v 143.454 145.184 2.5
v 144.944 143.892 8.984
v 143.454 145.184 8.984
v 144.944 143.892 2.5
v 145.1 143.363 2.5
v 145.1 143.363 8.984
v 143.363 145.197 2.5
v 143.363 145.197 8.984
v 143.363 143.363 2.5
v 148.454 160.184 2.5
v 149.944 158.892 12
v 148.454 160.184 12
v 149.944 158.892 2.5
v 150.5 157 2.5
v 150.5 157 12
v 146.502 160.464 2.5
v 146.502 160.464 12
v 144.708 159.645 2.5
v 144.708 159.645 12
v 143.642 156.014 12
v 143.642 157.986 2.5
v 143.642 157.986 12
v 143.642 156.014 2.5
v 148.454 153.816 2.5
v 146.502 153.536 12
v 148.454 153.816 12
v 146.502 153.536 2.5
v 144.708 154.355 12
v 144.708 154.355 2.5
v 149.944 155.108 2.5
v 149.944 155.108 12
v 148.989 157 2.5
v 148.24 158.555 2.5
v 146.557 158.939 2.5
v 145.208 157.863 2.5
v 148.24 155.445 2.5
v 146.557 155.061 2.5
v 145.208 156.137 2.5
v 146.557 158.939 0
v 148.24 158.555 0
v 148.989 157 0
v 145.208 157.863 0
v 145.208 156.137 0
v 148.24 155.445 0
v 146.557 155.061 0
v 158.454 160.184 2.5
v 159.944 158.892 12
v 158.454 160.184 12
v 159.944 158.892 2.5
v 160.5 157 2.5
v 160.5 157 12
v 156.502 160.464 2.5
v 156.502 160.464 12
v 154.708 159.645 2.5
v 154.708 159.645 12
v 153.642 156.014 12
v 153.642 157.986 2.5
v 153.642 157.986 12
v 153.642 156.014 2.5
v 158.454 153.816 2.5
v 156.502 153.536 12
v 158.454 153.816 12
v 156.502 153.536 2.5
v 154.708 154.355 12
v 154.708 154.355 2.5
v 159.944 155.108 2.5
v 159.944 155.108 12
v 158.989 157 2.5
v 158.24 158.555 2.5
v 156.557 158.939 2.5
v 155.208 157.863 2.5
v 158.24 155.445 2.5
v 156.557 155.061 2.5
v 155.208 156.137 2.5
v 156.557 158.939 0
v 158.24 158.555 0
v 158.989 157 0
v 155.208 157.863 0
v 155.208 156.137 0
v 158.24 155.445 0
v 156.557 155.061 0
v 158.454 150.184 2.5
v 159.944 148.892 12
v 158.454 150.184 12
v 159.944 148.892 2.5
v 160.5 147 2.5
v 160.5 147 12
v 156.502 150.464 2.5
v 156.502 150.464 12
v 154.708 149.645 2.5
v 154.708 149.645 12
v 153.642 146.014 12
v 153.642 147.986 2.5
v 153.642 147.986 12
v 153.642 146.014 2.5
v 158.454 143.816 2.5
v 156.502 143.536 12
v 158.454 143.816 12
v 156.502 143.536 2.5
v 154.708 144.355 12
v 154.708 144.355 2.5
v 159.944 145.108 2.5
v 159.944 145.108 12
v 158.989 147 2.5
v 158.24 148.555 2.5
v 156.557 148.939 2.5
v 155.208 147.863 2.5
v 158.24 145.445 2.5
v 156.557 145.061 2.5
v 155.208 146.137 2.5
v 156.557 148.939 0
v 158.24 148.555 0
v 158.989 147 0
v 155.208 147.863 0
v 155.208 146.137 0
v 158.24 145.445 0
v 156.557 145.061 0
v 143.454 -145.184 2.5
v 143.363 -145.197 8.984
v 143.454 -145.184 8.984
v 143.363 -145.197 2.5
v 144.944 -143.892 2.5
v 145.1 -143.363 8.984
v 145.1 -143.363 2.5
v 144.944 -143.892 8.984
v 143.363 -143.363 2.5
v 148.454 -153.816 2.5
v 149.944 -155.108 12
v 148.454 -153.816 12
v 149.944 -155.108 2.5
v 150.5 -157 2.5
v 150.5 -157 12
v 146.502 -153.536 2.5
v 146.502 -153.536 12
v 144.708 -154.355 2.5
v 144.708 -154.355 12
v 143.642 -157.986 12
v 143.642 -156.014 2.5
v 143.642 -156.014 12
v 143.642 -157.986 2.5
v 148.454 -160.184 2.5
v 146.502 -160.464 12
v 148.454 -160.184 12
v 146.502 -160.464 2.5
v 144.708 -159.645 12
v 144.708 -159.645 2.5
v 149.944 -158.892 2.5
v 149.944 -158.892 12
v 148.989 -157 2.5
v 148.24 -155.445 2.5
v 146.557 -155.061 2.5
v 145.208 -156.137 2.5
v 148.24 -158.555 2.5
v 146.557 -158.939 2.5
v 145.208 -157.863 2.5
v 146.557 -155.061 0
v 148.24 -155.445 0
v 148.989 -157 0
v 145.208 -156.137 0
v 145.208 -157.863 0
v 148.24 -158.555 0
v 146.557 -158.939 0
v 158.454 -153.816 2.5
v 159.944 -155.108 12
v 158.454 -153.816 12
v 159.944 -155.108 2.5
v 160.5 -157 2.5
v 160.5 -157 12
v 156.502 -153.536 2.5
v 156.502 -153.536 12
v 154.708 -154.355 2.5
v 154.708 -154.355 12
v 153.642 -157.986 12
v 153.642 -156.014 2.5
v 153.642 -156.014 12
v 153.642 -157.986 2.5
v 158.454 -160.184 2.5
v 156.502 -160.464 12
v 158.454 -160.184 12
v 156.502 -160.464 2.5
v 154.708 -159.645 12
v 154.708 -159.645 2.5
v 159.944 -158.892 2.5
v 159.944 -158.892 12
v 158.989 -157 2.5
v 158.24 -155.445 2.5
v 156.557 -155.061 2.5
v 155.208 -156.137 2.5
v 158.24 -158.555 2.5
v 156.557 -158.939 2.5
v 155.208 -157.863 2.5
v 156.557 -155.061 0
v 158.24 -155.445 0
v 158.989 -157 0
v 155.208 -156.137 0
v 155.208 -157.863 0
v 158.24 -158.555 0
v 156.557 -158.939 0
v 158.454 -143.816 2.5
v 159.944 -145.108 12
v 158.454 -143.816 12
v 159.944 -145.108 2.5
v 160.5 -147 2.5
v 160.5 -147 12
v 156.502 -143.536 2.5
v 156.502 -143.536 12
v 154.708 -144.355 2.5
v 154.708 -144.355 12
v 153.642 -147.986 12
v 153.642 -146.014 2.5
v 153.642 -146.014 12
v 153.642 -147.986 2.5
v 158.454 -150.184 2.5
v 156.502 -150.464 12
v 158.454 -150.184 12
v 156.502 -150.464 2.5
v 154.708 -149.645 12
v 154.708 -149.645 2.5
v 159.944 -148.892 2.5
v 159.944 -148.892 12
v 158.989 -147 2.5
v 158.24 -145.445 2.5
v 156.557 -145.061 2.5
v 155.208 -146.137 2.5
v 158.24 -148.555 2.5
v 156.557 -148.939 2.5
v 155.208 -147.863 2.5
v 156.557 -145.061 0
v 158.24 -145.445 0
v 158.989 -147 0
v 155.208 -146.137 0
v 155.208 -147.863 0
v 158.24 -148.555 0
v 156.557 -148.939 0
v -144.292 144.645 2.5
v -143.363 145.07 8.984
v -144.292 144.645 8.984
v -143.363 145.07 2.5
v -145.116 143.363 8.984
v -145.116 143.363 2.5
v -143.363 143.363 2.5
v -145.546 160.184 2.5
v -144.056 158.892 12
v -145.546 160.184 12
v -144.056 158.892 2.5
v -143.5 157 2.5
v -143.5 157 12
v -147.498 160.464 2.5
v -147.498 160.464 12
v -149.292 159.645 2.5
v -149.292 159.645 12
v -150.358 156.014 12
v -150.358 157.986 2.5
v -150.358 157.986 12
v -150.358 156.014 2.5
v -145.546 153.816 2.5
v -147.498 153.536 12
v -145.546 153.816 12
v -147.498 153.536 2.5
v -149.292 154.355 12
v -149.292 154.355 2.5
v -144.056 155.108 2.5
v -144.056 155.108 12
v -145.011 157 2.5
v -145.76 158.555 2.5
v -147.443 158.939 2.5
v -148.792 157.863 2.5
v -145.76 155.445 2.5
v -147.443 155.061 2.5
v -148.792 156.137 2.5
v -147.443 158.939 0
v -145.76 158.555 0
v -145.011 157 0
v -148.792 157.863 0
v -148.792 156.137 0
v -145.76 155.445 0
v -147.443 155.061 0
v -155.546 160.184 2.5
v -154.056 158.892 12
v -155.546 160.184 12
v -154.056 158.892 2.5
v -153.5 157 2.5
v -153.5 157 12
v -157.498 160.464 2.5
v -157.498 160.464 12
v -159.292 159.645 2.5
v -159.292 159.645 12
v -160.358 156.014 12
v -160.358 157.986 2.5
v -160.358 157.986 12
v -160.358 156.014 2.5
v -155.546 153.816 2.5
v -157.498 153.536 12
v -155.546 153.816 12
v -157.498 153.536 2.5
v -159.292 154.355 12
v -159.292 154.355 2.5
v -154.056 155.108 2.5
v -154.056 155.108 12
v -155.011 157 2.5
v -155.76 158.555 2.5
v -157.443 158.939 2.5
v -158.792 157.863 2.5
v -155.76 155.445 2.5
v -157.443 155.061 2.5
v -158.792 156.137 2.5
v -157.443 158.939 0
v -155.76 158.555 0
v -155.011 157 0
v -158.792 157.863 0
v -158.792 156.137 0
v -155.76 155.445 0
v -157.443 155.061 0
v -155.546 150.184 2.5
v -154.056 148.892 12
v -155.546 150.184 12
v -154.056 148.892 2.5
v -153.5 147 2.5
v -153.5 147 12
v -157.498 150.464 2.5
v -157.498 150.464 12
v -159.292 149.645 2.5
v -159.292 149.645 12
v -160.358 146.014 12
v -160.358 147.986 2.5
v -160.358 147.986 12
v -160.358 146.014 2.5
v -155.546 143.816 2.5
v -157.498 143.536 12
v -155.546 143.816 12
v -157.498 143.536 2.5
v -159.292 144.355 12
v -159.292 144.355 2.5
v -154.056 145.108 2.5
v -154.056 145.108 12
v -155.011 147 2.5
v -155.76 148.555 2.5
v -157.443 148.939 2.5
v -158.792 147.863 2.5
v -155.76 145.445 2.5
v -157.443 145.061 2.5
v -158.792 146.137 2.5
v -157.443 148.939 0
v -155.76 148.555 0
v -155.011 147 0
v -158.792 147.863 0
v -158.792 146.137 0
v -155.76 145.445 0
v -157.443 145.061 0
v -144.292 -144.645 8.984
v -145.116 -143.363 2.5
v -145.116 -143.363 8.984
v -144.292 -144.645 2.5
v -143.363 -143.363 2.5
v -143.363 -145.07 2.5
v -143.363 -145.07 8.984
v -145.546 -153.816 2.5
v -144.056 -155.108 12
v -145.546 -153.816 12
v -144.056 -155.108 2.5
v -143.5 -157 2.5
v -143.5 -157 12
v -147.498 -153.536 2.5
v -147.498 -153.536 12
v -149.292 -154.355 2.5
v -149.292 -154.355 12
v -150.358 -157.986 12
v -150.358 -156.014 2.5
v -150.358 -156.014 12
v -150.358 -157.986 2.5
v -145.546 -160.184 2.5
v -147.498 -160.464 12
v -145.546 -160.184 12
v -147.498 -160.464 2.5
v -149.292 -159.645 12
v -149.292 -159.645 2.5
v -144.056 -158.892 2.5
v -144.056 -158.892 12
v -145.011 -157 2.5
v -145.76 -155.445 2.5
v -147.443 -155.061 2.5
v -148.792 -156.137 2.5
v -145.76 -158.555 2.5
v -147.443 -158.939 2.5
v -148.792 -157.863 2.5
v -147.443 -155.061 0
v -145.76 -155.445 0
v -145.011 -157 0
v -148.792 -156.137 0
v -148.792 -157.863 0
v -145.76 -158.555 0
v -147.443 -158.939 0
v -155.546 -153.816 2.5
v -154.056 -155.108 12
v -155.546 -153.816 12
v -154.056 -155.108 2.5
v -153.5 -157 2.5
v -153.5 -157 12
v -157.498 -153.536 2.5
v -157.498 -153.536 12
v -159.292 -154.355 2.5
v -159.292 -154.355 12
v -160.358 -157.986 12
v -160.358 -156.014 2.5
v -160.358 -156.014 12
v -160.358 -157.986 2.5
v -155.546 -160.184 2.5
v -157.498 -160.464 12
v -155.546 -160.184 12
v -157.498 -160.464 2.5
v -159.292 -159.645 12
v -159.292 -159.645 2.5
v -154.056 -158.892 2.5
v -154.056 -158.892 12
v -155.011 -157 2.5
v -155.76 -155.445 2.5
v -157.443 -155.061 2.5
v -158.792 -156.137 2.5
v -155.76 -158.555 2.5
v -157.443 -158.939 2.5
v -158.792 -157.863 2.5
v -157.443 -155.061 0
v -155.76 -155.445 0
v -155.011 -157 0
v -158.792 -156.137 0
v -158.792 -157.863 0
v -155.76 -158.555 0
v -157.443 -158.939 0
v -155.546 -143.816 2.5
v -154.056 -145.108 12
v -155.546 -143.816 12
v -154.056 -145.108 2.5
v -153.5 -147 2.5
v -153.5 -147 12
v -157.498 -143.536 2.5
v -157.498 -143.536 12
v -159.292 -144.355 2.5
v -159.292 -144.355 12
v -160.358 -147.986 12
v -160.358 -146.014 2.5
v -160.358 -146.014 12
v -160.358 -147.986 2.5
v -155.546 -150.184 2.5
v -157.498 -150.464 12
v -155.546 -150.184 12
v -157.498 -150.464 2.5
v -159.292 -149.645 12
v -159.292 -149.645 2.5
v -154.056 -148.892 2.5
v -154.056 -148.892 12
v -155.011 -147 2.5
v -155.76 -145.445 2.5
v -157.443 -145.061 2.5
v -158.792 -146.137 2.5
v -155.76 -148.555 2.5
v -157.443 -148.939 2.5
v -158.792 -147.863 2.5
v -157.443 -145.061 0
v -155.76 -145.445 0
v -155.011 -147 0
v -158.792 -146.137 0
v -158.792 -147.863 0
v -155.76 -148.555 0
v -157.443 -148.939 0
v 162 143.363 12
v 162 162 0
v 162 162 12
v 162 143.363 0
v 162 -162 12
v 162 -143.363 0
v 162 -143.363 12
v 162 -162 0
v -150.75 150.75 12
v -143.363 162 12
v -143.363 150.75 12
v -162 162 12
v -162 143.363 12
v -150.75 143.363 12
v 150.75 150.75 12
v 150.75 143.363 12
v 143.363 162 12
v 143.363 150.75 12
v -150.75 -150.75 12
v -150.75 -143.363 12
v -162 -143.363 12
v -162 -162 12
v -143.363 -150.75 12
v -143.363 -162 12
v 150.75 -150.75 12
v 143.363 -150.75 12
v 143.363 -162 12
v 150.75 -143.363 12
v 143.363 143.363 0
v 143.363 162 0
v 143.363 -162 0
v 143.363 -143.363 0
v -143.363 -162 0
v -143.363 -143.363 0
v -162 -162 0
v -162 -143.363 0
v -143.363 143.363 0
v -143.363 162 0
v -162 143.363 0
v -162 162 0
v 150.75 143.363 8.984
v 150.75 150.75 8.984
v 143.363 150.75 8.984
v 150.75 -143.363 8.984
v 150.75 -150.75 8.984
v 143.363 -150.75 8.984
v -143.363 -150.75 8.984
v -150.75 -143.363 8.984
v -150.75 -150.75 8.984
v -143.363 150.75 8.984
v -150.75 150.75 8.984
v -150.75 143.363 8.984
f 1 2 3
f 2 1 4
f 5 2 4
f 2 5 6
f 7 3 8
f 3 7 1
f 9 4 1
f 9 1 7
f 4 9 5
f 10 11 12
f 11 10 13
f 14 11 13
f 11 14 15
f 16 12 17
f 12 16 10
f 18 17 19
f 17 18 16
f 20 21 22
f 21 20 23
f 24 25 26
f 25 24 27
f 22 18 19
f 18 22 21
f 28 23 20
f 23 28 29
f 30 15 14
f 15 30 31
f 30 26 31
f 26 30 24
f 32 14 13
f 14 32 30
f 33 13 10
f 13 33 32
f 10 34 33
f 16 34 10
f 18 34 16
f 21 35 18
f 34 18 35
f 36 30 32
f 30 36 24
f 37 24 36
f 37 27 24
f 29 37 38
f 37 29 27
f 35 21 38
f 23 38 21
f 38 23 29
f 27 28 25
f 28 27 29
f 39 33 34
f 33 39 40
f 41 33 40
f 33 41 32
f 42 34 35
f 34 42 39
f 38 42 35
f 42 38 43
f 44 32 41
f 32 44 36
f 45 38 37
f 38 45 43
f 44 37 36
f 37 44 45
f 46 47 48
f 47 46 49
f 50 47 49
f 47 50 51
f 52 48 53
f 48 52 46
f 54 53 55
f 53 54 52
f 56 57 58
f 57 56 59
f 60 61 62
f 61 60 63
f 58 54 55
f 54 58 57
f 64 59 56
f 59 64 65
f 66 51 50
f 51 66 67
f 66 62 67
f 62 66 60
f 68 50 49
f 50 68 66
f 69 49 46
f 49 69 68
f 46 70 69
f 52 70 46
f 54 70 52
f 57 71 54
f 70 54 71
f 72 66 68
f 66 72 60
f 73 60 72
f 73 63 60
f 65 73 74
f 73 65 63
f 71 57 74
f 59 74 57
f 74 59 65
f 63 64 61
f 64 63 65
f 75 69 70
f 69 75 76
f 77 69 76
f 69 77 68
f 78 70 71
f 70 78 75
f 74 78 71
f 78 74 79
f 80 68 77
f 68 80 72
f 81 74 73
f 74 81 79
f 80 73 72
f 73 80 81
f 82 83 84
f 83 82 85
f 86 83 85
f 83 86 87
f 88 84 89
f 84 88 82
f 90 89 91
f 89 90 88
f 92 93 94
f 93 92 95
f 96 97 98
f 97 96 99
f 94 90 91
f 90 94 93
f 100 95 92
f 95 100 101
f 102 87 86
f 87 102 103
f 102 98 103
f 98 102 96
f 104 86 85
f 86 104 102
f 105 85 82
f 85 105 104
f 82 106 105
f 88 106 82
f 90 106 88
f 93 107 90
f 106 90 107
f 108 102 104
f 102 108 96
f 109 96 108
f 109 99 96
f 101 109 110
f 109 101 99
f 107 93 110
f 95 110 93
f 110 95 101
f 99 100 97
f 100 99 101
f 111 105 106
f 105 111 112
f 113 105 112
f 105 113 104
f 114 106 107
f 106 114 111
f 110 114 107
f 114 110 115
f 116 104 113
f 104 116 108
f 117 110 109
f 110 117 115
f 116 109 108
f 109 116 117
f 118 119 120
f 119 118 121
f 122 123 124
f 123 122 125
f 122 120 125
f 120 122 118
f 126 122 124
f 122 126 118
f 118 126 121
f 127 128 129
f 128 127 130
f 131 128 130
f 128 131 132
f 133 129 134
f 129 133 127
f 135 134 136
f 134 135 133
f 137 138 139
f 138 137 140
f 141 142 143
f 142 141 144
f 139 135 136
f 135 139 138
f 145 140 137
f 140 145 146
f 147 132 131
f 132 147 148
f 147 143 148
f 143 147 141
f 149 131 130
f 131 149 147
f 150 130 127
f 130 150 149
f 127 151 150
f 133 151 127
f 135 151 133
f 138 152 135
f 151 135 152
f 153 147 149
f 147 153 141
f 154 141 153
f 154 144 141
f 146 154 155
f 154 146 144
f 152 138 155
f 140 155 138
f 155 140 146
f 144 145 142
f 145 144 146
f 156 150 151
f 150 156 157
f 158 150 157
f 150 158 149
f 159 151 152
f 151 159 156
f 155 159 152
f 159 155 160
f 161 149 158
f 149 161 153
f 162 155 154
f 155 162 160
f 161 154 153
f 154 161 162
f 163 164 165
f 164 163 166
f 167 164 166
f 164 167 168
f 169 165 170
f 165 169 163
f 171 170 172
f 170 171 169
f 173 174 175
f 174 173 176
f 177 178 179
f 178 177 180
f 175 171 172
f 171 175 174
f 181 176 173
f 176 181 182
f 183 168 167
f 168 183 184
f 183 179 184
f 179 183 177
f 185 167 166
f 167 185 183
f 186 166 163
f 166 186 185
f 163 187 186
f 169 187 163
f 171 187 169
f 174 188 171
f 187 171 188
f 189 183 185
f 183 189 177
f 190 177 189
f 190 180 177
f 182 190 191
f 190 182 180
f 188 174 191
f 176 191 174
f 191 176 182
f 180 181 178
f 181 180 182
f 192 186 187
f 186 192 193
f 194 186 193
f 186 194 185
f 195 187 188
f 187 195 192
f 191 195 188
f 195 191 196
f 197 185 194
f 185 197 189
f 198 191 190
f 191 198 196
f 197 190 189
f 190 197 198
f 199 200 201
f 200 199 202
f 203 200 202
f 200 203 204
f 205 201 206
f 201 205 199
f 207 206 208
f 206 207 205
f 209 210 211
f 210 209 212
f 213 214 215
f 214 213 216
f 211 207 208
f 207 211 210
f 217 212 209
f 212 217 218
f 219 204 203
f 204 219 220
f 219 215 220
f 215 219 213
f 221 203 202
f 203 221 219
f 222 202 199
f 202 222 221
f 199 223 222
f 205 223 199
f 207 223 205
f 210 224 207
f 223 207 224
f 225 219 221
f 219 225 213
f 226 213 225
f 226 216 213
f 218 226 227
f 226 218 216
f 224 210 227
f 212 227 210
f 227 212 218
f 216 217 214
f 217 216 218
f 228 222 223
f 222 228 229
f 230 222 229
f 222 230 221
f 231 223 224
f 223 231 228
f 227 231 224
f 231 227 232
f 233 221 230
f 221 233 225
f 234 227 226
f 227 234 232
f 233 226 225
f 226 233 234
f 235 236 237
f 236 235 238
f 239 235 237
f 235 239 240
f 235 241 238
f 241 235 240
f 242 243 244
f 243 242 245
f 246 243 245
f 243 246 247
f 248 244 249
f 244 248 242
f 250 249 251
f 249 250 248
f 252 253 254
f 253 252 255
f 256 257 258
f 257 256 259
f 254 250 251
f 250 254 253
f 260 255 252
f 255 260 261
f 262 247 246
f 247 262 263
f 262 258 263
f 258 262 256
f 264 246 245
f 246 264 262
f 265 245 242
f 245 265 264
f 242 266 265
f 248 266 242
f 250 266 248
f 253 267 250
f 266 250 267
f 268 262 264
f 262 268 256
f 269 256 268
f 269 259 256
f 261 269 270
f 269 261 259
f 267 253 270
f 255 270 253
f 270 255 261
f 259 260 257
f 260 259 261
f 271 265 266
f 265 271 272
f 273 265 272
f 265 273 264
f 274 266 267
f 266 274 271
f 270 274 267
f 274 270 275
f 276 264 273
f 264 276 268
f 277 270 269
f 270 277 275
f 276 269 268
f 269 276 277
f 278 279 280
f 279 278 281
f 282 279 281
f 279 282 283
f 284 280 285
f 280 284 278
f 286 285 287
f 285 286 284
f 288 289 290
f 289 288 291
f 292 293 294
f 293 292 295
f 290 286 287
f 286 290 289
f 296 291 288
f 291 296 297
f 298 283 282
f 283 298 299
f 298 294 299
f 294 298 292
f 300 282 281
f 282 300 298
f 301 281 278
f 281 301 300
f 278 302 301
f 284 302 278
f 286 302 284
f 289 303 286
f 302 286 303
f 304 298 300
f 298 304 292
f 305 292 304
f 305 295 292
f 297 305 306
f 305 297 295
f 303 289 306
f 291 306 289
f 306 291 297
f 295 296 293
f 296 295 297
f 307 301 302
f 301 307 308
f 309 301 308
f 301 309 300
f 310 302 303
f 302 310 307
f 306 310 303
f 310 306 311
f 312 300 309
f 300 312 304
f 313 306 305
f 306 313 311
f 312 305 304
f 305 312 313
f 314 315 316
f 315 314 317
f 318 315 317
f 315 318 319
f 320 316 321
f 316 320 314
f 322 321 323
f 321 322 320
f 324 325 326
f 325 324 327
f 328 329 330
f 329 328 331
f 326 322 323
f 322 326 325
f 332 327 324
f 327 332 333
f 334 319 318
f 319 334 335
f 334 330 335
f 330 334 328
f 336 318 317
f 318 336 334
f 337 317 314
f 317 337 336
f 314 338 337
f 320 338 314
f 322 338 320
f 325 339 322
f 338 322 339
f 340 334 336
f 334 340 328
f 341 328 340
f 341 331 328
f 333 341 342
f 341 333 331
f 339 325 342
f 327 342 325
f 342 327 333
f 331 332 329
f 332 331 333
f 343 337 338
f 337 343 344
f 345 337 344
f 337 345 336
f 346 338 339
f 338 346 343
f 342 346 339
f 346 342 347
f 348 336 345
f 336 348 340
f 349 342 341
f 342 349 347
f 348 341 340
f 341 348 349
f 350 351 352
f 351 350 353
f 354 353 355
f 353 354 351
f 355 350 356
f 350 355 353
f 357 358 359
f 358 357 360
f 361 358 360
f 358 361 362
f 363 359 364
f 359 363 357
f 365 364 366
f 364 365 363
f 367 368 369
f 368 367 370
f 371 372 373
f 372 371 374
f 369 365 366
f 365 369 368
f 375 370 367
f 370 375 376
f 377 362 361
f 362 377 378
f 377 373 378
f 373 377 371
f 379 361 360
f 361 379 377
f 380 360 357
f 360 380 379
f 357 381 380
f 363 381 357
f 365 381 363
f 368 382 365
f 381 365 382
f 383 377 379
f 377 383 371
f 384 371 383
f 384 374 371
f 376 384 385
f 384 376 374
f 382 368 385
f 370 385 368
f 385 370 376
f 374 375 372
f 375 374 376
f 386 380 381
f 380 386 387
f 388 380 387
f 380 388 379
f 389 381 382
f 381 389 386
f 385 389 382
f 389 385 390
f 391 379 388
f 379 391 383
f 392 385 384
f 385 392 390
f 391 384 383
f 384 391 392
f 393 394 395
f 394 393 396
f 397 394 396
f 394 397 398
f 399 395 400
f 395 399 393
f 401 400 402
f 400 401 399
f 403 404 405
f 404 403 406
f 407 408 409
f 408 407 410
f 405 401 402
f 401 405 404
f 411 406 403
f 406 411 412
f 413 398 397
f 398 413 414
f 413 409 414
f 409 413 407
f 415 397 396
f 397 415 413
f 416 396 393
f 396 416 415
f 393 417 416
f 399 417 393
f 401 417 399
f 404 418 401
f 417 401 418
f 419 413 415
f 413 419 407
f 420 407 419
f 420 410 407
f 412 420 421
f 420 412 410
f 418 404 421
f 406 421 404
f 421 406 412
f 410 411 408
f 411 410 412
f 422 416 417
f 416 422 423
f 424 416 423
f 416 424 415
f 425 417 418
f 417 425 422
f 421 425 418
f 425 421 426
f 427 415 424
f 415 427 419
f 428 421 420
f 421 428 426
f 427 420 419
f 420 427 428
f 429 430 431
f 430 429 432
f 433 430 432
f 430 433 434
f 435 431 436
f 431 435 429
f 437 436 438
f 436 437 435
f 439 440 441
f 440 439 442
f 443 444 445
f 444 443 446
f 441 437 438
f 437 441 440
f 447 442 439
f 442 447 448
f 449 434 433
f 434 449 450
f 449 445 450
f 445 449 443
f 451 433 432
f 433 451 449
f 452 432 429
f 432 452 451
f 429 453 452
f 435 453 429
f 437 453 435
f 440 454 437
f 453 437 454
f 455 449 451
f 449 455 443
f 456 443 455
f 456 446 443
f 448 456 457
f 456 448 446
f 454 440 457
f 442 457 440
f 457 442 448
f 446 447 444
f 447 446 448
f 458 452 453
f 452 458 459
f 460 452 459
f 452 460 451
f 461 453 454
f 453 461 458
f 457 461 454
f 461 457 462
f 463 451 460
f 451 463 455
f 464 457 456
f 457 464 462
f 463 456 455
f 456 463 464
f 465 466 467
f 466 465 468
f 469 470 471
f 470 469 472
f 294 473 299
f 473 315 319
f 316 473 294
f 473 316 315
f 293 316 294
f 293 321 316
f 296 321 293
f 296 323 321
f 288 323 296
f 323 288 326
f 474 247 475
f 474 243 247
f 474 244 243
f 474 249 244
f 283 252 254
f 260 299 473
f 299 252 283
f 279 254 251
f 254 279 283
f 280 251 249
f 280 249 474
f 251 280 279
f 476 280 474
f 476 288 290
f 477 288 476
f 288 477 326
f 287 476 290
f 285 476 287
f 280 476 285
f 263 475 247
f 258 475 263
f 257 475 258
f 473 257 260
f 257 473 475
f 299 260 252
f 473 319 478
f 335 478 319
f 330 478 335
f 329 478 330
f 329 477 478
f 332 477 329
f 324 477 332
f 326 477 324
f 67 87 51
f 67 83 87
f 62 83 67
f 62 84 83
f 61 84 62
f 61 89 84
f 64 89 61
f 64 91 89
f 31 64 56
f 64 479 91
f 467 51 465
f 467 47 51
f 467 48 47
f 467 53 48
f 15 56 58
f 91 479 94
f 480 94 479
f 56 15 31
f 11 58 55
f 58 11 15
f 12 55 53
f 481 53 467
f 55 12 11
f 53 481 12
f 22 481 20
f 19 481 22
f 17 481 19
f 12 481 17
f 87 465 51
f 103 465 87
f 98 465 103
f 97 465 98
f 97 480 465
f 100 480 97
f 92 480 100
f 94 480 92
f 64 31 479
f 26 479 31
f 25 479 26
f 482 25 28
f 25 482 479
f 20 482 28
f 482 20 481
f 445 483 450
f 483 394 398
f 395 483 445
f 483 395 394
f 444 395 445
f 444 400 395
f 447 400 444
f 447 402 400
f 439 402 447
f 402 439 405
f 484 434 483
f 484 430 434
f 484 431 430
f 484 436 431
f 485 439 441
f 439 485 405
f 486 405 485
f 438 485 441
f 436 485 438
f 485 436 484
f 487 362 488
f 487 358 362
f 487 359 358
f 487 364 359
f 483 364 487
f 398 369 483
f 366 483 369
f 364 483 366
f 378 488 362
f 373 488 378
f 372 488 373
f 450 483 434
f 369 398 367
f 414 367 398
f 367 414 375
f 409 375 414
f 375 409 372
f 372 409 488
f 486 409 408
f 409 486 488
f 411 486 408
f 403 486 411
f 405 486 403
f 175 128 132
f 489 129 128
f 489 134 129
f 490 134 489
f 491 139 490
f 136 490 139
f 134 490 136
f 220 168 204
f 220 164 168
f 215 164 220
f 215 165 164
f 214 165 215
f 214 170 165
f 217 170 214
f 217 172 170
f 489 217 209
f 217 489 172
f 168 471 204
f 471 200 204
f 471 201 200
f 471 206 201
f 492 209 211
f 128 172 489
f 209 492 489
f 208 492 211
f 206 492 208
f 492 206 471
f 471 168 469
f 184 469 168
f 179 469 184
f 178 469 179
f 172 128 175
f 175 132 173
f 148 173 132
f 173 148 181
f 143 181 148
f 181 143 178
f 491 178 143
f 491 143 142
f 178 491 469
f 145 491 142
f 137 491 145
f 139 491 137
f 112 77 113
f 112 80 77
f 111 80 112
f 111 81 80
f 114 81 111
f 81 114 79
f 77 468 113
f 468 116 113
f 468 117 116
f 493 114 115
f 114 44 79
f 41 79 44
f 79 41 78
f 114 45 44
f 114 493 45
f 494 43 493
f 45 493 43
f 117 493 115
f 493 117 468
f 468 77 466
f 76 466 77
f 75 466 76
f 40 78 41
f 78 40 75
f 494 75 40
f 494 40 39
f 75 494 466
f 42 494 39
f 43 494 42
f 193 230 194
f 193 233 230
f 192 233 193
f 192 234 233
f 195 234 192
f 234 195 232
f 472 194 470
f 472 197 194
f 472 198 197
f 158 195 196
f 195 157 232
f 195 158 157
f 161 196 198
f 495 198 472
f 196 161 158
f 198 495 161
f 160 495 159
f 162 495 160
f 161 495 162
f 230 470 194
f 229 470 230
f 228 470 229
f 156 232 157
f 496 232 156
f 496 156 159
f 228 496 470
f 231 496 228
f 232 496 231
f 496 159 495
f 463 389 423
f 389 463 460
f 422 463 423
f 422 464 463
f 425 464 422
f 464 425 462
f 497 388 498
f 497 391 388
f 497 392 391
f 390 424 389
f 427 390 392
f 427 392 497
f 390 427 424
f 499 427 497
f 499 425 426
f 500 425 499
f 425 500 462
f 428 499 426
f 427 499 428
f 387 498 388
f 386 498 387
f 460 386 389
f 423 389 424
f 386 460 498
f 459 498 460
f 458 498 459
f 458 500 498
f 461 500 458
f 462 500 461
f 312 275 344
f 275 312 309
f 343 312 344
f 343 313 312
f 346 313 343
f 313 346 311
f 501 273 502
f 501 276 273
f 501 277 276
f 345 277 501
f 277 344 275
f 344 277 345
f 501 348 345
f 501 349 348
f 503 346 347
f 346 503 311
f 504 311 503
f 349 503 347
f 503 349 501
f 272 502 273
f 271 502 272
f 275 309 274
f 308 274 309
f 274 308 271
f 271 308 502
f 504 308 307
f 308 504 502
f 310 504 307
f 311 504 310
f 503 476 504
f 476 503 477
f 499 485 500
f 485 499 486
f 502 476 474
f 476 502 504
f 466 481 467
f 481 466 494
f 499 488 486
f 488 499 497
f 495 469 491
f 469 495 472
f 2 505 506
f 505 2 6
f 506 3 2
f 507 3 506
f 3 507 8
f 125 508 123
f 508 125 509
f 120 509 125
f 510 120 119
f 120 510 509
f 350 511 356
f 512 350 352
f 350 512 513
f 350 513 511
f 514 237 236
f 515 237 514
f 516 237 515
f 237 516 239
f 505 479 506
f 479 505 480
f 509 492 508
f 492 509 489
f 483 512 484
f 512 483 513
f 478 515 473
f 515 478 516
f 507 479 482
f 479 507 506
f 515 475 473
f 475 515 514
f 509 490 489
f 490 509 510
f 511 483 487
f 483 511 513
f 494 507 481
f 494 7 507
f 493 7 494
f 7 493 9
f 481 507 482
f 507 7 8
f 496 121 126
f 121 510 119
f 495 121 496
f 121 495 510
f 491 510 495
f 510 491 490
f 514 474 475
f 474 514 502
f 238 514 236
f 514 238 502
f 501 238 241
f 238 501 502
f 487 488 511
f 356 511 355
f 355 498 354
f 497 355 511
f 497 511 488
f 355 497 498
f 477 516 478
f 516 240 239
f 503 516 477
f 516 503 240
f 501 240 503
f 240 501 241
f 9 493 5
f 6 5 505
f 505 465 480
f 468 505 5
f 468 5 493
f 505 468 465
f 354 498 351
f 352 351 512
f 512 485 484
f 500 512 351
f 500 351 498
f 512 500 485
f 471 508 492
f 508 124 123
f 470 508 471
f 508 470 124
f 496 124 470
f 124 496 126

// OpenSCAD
use<MCAD/nuts_and_bolts.scad>
holes = [[142,142],[147,157],[157,157],[157,147] ];



//spreader=[0.4+12*25.4,0.4+9*25.4,3];
spreader=[0,0,0];
glass=[1.5+300,1.5+300,3.08];
cork=[12*25.4,12*25.4,3];
screws_offset=(5/64)*25.4 + 3;
heater=[225,225,1];
cork_plane = [cork[0],cork[1],cork[2]+screws_offset];

*color("red")translate([0,0,heater[2]/2 + cork_plane[2]])cube(heater,center=true);
*color("blue")translate([0,0,heater[2]+spreader[2]/2 + cork_plane[2]])cube(spreader,center=true);
*color("yellow")translate([0,0,heater[2]+glass[2]/2+ spreader[2] + cork_plane[2]])cube(glass,center=true);

bracket = [162*2,162*2,12];
cutout=1.13 ;

// corner mounting holes
difference() {
  translate([0,0,bracket[2]/2])cube(bracket,center=true);
for (k = [1,-1])
  for (j = [1,-1]) 
    for (i = holes) {
      mirror([0,0,1])translate([k*i[0],j*i[1],-bracket[2]+9.5])boltHole(size=4, length=bracket[2]);
      mirror([0,0,1])translate([k*i[0],j*i[1],-bracket[2]+7])boltHole(size=4, length=bracket[2]);
      mirror([0,0,1])translate([k*i[0],j*i[1],-bracket[2]+5])boltHole(size=4, length=bracket[2]);
      mirror([0,0,1])translate([k*i[0],j*i[1],-bracket[2]+3])boltHole(size=4, length=bracket[2]);
//      *cylinder(r=3.2/2, h=bracket[2]+5);
    }
color("red")translate([0,0,heater[2]/2 + cork_plane[2]])cube(heater,center=true);
color("blue")translate([0,0,heater[2]+spreader[2]/2 + cork_plane[2]])cube(spreader,center=true);
color("yellow")translate([0,0,heater[2]+glass[2]/2+ spreader[2] + cork_plane[2]])cube(glass,center=true);
color("green") translate([0,0,bracket[2]/2])cube([bracket[0]/cutout,bracket[1],bracket[2]],center=true);
color("green") translate([0,0,bracket[2]/2])cube([bracket[0],bracket[1]/cutout,bracket[2]],center=true);

}
